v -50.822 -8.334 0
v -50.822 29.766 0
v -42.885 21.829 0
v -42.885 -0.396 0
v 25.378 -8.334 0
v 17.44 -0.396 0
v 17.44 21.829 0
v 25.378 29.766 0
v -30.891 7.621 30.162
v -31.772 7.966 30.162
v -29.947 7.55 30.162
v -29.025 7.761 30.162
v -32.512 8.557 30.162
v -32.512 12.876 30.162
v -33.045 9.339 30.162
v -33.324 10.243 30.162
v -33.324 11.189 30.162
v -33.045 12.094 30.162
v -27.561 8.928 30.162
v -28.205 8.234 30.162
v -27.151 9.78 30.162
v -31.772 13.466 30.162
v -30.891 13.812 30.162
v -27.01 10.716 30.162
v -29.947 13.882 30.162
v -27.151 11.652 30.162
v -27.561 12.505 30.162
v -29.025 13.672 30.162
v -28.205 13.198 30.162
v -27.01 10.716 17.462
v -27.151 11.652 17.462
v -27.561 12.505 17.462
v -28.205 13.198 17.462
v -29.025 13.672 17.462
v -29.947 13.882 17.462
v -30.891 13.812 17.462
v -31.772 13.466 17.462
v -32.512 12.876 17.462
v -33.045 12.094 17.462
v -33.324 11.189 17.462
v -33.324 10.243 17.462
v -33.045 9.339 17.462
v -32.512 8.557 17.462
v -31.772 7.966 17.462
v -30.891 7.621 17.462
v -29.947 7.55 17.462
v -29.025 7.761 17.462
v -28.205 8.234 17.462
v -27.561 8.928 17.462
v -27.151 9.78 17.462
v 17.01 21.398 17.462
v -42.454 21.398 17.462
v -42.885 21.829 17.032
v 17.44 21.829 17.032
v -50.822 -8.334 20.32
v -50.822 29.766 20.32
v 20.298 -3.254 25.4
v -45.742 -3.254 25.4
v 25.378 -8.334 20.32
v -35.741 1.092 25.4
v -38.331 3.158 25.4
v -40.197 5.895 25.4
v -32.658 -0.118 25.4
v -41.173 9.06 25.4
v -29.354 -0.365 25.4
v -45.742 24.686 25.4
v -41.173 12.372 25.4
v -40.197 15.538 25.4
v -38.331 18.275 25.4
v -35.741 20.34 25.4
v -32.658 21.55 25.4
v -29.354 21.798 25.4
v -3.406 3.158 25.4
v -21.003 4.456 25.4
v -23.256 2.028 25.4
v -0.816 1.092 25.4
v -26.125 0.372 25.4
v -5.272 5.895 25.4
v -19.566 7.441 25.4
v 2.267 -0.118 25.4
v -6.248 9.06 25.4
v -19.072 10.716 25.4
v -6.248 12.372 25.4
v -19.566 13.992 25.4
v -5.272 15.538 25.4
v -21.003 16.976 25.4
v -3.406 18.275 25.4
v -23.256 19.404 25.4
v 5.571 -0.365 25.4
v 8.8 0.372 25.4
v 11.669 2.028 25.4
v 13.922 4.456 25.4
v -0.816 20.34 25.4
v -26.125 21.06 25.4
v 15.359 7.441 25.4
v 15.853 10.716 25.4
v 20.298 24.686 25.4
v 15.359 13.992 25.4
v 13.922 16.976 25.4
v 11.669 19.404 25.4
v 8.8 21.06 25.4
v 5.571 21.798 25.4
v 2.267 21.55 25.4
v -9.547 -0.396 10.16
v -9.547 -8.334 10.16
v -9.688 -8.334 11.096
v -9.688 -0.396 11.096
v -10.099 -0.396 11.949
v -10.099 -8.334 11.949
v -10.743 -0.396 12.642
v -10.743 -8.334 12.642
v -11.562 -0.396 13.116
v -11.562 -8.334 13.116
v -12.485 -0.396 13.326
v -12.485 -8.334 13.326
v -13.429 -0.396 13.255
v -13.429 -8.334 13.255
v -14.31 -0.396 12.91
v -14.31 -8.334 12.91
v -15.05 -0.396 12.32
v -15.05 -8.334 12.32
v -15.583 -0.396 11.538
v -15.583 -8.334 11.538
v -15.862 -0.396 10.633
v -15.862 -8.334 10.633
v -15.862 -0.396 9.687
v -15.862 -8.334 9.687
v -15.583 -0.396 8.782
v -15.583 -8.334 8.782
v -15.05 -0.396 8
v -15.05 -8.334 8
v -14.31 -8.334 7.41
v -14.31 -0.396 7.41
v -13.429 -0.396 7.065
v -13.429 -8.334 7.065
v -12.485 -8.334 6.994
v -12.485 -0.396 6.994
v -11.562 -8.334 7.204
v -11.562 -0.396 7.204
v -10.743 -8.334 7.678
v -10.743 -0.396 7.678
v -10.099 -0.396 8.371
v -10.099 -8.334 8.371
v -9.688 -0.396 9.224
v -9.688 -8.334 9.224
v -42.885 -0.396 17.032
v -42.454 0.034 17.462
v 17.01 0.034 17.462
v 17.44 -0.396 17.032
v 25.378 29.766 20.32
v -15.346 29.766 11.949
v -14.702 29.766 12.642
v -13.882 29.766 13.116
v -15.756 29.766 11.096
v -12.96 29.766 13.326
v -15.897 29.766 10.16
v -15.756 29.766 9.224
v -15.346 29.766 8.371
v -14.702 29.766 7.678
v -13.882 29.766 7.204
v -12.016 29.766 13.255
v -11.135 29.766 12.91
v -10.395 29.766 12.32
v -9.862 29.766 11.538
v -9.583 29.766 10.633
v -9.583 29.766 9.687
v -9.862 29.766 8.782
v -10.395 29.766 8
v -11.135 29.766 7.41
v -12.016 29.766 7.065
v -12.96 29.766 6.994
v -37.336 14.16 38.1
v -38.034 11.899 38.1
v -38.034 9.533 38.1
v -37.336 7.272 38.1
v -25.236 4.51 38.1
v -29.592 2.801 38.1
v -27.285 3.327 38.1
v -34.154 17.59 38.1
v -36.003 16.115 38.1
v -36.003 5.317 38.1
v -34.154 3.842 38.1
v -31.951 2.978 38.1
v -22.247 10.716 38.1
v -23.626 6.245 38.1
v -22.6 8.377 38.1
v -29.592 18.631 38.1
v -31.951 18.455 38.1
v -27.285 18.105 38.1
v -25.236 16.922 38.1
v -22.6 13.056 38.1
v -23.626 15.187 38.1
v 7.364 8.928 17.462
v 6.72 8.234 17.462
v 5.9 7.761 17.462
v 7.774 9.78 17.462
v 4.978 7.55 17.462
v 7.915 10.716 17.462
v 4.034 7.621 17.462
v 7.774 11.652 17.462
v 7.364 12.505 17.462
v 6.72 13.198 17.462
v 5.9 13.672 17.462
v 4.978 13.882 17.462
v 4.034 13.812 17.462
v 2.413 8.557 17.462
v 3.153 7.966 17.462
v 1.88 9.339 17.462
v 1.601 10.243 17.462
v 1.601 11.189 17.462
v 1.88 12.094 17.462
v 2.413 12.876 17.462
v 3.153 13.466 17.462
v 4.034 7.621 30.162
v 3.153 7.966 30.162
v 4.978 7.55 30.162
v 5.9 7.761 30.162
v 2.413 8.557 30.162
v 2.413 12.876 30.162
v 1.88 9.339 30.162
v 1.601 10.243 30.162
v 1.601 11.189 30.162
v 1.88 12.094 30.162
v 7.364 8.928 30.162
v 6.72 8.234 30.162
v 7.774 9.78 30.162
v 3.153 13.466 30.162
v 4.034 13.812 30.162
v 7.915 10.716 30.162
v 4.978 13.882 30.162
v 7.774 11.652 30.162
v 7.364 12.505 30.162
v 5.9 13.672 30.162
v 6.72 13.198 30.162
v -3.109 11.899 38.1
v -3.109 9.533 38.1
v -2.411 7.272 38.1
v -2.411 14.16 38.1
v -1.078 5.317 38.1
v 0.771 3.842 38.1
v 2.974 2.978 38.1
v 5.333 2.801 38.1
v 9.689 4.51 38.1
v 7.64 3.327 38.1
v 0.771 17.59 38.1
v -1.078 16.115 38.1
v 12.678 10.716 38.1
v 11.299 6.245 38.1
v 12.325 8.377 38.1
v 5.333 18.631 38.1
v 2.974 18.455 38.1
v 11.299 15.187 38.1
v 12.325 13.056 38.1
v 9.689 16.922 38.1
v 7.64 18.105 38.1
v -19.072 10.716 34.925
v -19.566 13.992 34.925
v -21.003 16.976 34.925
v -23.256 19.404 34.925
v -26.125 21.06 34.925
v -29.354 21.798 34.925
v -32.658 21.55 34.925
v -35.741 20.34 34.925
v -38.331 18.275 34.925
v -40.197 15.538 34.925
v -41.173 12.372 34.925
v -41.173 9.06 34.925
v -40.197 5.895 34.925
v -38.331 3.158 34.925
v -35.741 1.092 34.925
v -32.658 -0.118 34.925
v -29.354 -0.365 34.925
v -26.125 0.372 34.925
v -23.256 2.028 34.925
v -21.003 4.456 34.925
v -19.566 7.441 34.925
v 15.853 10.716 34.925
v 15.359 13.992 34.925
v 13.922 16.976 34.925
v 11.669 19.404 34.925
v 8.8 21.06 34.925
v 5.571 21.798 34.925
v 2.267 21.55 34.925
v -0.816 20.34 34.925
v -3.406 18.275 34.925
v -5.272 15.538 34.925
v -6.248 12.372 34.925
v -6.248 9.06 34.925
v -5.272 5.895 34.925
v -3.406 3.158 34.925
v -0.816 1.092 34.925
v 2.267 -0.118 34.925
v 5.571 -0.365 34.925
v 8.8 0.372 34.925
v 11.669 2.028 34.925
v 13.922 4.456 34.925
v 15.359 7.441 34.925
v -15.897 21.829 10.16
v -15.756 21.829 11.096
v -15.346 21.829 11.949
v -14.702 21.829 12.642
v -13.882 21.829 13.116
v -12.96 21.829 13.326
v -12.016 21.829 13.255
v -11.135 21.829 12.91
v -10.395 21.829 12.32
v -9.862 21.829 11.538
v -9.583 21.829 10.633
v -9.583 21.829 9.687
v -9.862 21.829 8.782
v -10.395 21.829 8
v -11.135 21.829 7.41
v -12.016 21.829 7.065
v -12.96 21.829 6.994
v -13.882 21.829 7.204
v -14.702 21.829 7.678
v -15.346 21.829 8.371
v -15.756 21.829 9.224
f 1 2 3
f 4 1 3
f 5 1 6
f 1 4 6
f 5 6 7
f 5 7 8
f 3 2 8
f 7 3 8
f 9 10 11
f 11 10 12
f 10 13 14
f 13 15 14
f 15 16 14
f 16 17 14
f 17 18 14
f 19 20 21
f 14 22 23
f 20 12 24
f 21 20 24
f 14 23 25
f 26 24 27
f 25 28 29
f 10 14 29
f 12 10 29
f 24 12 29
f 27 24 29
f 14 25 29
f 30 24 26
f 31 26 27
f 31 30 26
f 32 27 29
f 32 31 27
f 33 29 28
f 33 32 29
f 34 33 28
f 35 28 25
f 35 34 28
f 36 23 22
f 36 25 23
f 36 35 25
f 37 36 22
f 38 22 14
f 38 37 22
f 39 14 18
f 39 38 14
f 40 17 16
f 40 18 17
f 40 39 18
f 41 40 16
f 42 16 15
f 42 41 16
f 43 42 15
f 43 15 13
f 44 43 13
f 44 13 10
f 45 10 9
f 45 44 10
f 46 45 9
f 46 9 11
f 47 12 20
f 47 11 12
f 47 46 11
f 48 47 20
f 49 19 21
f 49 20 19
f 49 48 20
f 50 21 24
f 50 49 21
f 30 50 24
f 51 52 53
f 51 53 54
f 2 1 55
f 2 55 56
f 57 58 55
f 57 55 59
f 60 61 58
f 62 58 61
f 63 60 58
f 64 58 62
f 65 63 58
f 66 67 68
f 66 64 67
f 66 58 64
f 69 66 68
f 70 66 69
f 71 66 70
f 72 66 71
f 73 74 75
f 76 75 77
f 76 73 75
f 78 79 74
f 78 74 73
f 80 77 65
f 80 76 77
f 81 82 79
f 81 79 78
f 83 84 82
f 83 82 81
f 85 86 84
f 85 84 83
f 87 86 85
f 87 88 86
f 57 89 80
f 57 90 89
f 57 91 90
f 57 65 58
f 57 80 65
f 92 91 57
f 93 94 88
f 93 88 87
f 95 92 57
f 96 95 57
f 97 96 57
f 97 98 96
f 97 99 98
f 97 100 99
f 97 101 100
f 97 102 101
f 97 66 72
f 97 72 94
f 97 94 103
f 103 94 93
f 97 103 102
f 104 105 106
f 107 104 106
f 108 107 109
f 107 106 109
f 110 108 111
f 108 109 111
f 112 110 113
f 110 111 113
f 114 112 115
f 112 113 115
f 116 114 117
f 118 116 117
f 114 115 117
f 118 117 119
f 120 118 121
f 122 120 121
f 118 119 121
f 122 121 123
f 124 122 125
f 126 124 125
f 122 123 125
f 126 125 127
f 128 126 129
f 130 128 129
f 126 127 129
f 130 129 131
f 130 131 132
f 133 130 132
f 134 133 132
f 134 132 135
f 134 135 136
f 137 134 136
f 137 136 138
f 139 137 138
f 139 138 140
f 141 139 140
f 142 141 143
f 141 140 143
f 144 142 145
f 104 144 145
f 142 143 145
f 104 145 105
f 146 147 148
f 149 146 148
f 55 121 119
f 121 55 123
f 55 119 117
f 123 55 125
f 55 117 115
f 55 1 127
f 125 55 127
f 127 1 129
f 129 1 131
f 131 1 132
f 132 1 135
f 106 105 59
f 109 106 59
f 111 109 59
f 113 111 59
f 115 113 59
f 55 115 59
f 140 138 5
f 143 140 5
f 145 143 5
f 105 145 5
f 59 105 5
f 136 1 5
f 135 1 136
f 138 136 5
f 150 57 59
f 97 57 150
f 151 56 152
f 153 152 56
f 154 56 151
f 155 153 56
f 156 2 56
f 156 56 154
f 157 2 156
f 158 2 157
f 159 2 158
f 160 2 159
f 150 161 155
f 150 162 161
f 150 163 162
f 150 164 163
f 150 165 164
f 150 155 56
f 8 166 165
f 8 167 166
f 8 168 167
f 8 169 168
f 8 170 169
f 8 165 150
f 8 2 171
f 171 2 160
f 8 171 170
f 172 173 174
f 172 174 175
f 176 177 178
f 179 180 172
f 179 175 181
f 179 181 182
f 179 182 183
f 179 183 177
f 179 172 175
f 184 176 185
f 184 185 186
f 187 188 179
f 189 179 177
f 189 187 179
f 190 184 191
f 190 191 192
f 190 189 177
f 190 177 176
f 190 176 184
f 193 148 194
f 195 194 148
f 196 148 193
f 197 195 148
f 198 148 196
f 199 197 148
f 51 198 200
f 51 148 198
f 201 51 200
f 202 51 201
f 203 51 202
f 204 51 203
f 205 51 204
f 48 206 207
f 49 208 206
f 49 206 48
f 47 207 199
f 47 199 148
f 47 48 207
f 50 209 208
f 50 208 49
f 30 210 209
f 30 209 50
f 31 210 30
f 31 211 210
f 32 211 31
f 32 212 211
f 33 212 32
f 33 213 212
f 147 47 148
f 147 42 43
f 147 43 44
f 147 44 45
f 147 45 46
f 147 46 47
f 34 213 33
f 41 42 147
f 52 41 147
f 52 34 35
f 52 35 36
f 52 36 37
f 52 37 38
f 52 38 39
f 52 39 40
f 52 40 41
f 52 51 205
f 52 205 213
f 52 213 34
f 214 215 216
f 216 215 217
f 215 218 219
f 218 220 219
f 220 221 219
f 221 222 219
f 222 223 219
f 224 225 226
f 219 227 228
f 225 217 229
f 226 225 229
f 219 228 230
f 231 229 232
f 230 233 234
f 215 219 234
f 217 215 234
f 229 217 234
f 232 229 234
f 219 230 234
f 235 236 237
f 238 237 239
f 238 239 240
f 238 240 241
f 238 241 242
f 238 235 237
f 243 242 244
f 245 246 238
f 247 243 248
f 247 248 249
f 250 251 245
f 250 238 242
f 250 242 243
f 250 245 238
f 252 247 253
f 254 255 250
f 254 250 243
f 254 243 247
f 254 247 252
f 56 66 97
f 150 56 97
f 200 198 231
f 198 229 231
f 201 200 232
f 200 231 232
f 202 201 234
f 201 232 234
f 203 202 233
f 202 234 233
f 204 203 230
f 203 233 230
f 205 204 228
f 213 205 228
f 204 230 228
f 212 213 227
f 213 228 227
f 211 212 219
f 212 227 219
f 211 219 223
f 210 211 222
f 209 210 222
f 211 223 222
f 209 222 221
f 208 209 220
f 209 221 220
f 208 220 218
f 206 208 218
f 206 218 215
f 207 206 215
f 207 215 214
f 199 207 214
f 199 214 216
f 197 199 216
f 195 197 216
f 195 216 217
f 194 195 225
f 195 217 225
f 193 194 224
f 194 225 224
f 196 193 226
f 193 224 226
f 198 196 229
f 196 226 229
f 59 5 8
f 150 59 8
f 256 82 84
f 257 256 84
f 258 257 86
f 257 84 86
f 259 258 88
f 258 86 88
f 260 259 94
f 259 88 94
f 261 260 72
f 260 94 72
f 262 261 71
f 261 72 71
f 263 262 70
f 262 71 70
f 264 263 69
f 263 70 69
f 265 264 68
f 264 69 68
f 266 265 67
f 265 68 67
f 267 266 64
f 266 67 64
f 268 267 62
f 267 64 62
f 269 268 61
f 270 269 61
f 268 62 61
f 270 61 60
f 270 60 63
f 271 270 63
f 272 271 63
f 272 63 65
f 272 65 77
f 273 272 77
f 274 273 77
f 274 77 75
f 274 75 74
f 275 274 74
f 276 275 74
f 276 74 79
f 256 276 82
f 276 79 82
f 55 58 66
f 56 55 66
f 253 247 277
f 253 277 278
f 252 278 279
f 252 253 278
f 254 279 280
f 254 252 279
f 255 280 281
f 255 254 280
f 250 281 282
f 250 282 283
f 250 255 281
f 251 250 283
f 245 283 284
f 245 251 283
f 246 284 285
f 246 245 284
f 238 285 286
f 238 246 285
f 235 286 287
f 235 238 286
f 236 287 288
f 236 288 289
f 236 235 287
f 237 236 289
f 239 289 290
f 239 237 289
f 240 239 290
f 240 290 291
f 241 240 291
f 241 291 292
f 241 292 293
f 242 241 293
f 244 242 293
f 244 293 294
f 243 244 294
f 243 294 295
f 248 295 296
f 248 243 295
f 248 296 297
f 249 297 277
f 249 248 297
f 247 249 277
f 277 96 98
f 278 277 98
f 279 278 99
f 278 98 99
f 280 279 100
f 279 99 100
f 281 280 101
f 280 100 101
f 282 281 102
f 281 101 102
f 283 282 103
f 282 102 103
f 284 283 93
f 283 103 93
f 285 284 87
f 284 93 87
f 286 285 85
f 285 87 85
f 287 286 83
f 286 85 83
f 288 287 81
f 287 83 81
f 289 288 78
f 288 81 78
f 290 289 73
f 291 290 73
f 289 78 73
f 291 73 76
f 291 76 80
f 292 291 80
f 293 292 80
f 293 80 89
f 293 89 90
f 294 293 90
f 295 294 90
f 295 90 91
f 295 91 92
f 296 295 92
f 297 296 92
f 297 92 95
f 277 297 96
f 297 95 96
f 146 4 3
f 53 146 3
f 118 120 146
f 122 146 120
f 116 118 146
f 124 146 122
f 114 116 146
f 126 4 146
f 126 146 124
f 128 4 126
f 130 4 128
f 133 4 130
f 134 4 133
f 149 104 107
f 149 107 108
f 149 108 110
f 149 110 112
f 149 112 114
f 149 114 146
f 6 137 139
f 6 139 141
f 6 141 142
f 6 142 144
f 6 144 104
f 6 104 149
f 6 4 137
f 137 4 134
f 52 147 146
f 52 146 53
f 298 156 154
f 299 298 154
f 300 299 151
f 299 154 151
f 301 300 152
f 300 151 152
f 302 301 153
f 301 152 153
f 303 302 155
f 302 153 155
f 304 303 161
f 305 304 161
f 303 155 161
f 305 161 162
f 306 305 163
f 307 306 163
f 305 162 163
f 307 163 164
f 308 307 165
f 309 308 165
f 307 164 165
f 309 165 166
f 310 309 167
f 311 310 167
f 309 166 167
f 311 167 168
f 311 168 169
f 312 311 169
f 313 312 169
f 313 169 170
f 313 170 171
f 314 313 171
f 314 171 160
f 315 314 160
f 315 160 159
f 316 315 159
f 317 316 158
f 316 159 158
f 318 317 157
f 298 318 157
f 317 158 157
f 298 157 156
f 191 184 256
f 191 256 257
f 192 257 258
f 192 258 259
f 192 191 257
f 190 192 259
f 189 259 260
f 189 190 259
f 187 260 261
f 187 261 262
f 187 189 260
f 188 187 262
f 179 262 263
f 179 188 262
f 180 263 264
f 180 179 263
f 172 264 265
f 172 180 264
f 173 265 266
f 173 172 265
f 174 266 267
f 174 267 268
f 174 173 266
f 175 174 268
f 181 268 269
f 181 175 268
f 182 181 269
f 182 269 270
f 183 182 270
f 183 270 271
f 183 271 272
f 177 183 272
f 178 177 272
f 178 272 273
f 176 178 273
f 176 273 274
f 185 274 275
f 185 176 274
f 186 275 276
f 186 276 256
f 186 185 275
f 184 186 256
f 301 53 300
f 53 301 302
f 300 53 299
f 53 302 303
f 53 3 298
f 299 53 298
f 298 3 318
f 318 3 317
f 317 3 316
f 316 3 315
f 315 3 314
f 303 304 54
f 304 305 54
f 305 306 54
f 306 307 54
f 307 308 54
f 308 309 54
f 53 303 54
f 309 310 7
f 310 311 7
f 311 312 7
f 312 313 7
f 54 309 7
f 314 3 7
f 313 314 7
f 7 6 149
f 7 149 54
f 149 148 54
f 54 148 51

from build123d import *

# Parameters (mm, degrees)
F0_W      = 76.2
F0_H      = 38.1
F1_DEPTH  = 25.4
F2_SIZE   = 5.08
F3_R      = 11.1125
F4_DEPTH  = 12.7
F5_SIZE   = 3.175
F7_T      = 7.9375
F6_R      = 3.175
F8_DEPTH  = 7.9375
F9_R      = 3.175
F10_DEPTH = 7.9375


# Not quite as in the source:
# - a shell that OpenCascade refuses in one call is made with other operations: the cavity is built on its own and cut out


with BuildPart() as f1:
    # F0 (on Top) → F1 (new body)
    with BuildSketch(Plane.XY):
        with Locations((-12.72226125, 10.7161214997)):
            Rectangle(F0_W, F0_H)
    extrude(amount=F1_DEPTH)

    # F2
    f2_edges = [f1.edges().sort_by_distance(p)[0] for p in [
        (-50.822261, 10.716121, 25.4),
        (-12.722261, 29.766121, 25.4),
        (-12.722261, -8.333879, 25.4),
        (25.377739, 10.716121, 25.4),
    ]]
    chamfer(f2_edges, length=F2_SIZE)

    # F3 (on face) → F4 (join)
    with BuildSketch(Plane.XY.offset(25.4)):
        with Locations((-30.18476125, 10.7161214997)):
            Circle(F3_R)
        with Locations((4.74023875, 10.7161214997)):
            Circle(F3_R)
    extrude(amount=F4_DEPTH)

    # F5
    f5_edges = [f1.edges().sort_by_distance(p)[0] for p in [
        (-41.297261, 10.716121, 38.1),
        (-6.372261, 10.716121, 38.1),
    ]]
    chamfer(f5_edges, length=F5_SIZE)

    # F7: shell of thickness 7.9375, made by hand


with BuildPart() as f7_core1:
    # F7_t2: copy of F1
    add(f1.part)

    # the walls: a layer under each face that stays
    f7_faces = [f7_core1.faces().sort_by_distance(p)[0] for p in [
        (-41.29726125, 10.7161214997, 30.1625),
        (-39.70976125, 10.7161214997, 36.5125),
        (-12.72226125, 10.7161214997, 25.4),
        (-30.18476125, 10.7161214997, 38.1),
        (-48.28226125, 10.7161214997, 22.86),
        (-12.72226125, 27.2261214997, 22.86),
        (-12.72226125, -5.7938785003, 22.86),
        (22.83773875, 10.7161214997, 22.86),
        (-6.37226125, 10.7161214997, 30.1625),
        (-50.82226125, 10.7161214997, 10.16),
        (-12.72226125, 29.7661214997, 10.16),
        (-12.72226125, -8.3338785003, 10.16),
        (25.37773875, 10.7161214997, 10.16),
        (-4.78476125, 10.7161214997, 36.5125),
        (4.74023875, 10.7161214997, 38.1),
    ]]
    thicken(f7_faces, amount=-F7_T, mode=Mode.SUBTRACT)

    # F7_s3 → F7_t4 (revolve, cut)
    with BuildSketch(Plane.XZ.offset(-10.7161214997)):
        Polygon((-18.99288625, 25.479375), (-27.00976125, 25.4), (-27.00976125, 17.4625), (-19.07226125, 17.4625), align=None)
    revolve(axis=Axis((-30.18476125, 10.7161214997, 25.4), (0, 0, 1)), mode=Mode.SUBTRACT)

    # F7_s5 → F7_t6 (revolve, cut)
    with BuildSketch(Plane.XZ.offset(-10.7161214997)):
        Polygon((15.93211375, 25.479375), (15.85273875, 17.4625), (7.91523875, 17.4625), (7.91523875, 25.4), align=None)
    revolve(axis=Axis((4.74023875, 10.7161214997, 25.4), (0, 0, 1)), mode=Mode.SUBTRACT)


with BuildPart() as f1_1:
    add(f1.part)

    # what is left inside the walls is the cavity
    f7_cavity = [f7_core1.part.solids().sort_by_distance(p)[0] for p in [
        (-12.722261, 7.011955, 0.079375),
    ]]
    add(f7_cavity, mode=Mode.SUBTRACT)

    # F6 (on face) → F8 (cut)
    with BuildSketch(Plane.XZ.offset(8.3338785003)):
        with Locations((-12.72226125, 10.16)):
            Circle(F6_R)
    extrude(amount=-F8_DEPTH, mode=Mode.SUBTRACT)

    # F9 (on face) → F10 (cut)
    with BuildSketch(Plane(origin=(0, 29.7661214997, 0), x_dir=(-1, 0, 0), z_dir=(0, 1, 0))):
        with Locations((12.72226125, 10.16)):
            Circle(F9_R)
    extrude(amount=-F10_DEPTH, mode=Mode.SUBTRACT)


solid = f1_1.part
